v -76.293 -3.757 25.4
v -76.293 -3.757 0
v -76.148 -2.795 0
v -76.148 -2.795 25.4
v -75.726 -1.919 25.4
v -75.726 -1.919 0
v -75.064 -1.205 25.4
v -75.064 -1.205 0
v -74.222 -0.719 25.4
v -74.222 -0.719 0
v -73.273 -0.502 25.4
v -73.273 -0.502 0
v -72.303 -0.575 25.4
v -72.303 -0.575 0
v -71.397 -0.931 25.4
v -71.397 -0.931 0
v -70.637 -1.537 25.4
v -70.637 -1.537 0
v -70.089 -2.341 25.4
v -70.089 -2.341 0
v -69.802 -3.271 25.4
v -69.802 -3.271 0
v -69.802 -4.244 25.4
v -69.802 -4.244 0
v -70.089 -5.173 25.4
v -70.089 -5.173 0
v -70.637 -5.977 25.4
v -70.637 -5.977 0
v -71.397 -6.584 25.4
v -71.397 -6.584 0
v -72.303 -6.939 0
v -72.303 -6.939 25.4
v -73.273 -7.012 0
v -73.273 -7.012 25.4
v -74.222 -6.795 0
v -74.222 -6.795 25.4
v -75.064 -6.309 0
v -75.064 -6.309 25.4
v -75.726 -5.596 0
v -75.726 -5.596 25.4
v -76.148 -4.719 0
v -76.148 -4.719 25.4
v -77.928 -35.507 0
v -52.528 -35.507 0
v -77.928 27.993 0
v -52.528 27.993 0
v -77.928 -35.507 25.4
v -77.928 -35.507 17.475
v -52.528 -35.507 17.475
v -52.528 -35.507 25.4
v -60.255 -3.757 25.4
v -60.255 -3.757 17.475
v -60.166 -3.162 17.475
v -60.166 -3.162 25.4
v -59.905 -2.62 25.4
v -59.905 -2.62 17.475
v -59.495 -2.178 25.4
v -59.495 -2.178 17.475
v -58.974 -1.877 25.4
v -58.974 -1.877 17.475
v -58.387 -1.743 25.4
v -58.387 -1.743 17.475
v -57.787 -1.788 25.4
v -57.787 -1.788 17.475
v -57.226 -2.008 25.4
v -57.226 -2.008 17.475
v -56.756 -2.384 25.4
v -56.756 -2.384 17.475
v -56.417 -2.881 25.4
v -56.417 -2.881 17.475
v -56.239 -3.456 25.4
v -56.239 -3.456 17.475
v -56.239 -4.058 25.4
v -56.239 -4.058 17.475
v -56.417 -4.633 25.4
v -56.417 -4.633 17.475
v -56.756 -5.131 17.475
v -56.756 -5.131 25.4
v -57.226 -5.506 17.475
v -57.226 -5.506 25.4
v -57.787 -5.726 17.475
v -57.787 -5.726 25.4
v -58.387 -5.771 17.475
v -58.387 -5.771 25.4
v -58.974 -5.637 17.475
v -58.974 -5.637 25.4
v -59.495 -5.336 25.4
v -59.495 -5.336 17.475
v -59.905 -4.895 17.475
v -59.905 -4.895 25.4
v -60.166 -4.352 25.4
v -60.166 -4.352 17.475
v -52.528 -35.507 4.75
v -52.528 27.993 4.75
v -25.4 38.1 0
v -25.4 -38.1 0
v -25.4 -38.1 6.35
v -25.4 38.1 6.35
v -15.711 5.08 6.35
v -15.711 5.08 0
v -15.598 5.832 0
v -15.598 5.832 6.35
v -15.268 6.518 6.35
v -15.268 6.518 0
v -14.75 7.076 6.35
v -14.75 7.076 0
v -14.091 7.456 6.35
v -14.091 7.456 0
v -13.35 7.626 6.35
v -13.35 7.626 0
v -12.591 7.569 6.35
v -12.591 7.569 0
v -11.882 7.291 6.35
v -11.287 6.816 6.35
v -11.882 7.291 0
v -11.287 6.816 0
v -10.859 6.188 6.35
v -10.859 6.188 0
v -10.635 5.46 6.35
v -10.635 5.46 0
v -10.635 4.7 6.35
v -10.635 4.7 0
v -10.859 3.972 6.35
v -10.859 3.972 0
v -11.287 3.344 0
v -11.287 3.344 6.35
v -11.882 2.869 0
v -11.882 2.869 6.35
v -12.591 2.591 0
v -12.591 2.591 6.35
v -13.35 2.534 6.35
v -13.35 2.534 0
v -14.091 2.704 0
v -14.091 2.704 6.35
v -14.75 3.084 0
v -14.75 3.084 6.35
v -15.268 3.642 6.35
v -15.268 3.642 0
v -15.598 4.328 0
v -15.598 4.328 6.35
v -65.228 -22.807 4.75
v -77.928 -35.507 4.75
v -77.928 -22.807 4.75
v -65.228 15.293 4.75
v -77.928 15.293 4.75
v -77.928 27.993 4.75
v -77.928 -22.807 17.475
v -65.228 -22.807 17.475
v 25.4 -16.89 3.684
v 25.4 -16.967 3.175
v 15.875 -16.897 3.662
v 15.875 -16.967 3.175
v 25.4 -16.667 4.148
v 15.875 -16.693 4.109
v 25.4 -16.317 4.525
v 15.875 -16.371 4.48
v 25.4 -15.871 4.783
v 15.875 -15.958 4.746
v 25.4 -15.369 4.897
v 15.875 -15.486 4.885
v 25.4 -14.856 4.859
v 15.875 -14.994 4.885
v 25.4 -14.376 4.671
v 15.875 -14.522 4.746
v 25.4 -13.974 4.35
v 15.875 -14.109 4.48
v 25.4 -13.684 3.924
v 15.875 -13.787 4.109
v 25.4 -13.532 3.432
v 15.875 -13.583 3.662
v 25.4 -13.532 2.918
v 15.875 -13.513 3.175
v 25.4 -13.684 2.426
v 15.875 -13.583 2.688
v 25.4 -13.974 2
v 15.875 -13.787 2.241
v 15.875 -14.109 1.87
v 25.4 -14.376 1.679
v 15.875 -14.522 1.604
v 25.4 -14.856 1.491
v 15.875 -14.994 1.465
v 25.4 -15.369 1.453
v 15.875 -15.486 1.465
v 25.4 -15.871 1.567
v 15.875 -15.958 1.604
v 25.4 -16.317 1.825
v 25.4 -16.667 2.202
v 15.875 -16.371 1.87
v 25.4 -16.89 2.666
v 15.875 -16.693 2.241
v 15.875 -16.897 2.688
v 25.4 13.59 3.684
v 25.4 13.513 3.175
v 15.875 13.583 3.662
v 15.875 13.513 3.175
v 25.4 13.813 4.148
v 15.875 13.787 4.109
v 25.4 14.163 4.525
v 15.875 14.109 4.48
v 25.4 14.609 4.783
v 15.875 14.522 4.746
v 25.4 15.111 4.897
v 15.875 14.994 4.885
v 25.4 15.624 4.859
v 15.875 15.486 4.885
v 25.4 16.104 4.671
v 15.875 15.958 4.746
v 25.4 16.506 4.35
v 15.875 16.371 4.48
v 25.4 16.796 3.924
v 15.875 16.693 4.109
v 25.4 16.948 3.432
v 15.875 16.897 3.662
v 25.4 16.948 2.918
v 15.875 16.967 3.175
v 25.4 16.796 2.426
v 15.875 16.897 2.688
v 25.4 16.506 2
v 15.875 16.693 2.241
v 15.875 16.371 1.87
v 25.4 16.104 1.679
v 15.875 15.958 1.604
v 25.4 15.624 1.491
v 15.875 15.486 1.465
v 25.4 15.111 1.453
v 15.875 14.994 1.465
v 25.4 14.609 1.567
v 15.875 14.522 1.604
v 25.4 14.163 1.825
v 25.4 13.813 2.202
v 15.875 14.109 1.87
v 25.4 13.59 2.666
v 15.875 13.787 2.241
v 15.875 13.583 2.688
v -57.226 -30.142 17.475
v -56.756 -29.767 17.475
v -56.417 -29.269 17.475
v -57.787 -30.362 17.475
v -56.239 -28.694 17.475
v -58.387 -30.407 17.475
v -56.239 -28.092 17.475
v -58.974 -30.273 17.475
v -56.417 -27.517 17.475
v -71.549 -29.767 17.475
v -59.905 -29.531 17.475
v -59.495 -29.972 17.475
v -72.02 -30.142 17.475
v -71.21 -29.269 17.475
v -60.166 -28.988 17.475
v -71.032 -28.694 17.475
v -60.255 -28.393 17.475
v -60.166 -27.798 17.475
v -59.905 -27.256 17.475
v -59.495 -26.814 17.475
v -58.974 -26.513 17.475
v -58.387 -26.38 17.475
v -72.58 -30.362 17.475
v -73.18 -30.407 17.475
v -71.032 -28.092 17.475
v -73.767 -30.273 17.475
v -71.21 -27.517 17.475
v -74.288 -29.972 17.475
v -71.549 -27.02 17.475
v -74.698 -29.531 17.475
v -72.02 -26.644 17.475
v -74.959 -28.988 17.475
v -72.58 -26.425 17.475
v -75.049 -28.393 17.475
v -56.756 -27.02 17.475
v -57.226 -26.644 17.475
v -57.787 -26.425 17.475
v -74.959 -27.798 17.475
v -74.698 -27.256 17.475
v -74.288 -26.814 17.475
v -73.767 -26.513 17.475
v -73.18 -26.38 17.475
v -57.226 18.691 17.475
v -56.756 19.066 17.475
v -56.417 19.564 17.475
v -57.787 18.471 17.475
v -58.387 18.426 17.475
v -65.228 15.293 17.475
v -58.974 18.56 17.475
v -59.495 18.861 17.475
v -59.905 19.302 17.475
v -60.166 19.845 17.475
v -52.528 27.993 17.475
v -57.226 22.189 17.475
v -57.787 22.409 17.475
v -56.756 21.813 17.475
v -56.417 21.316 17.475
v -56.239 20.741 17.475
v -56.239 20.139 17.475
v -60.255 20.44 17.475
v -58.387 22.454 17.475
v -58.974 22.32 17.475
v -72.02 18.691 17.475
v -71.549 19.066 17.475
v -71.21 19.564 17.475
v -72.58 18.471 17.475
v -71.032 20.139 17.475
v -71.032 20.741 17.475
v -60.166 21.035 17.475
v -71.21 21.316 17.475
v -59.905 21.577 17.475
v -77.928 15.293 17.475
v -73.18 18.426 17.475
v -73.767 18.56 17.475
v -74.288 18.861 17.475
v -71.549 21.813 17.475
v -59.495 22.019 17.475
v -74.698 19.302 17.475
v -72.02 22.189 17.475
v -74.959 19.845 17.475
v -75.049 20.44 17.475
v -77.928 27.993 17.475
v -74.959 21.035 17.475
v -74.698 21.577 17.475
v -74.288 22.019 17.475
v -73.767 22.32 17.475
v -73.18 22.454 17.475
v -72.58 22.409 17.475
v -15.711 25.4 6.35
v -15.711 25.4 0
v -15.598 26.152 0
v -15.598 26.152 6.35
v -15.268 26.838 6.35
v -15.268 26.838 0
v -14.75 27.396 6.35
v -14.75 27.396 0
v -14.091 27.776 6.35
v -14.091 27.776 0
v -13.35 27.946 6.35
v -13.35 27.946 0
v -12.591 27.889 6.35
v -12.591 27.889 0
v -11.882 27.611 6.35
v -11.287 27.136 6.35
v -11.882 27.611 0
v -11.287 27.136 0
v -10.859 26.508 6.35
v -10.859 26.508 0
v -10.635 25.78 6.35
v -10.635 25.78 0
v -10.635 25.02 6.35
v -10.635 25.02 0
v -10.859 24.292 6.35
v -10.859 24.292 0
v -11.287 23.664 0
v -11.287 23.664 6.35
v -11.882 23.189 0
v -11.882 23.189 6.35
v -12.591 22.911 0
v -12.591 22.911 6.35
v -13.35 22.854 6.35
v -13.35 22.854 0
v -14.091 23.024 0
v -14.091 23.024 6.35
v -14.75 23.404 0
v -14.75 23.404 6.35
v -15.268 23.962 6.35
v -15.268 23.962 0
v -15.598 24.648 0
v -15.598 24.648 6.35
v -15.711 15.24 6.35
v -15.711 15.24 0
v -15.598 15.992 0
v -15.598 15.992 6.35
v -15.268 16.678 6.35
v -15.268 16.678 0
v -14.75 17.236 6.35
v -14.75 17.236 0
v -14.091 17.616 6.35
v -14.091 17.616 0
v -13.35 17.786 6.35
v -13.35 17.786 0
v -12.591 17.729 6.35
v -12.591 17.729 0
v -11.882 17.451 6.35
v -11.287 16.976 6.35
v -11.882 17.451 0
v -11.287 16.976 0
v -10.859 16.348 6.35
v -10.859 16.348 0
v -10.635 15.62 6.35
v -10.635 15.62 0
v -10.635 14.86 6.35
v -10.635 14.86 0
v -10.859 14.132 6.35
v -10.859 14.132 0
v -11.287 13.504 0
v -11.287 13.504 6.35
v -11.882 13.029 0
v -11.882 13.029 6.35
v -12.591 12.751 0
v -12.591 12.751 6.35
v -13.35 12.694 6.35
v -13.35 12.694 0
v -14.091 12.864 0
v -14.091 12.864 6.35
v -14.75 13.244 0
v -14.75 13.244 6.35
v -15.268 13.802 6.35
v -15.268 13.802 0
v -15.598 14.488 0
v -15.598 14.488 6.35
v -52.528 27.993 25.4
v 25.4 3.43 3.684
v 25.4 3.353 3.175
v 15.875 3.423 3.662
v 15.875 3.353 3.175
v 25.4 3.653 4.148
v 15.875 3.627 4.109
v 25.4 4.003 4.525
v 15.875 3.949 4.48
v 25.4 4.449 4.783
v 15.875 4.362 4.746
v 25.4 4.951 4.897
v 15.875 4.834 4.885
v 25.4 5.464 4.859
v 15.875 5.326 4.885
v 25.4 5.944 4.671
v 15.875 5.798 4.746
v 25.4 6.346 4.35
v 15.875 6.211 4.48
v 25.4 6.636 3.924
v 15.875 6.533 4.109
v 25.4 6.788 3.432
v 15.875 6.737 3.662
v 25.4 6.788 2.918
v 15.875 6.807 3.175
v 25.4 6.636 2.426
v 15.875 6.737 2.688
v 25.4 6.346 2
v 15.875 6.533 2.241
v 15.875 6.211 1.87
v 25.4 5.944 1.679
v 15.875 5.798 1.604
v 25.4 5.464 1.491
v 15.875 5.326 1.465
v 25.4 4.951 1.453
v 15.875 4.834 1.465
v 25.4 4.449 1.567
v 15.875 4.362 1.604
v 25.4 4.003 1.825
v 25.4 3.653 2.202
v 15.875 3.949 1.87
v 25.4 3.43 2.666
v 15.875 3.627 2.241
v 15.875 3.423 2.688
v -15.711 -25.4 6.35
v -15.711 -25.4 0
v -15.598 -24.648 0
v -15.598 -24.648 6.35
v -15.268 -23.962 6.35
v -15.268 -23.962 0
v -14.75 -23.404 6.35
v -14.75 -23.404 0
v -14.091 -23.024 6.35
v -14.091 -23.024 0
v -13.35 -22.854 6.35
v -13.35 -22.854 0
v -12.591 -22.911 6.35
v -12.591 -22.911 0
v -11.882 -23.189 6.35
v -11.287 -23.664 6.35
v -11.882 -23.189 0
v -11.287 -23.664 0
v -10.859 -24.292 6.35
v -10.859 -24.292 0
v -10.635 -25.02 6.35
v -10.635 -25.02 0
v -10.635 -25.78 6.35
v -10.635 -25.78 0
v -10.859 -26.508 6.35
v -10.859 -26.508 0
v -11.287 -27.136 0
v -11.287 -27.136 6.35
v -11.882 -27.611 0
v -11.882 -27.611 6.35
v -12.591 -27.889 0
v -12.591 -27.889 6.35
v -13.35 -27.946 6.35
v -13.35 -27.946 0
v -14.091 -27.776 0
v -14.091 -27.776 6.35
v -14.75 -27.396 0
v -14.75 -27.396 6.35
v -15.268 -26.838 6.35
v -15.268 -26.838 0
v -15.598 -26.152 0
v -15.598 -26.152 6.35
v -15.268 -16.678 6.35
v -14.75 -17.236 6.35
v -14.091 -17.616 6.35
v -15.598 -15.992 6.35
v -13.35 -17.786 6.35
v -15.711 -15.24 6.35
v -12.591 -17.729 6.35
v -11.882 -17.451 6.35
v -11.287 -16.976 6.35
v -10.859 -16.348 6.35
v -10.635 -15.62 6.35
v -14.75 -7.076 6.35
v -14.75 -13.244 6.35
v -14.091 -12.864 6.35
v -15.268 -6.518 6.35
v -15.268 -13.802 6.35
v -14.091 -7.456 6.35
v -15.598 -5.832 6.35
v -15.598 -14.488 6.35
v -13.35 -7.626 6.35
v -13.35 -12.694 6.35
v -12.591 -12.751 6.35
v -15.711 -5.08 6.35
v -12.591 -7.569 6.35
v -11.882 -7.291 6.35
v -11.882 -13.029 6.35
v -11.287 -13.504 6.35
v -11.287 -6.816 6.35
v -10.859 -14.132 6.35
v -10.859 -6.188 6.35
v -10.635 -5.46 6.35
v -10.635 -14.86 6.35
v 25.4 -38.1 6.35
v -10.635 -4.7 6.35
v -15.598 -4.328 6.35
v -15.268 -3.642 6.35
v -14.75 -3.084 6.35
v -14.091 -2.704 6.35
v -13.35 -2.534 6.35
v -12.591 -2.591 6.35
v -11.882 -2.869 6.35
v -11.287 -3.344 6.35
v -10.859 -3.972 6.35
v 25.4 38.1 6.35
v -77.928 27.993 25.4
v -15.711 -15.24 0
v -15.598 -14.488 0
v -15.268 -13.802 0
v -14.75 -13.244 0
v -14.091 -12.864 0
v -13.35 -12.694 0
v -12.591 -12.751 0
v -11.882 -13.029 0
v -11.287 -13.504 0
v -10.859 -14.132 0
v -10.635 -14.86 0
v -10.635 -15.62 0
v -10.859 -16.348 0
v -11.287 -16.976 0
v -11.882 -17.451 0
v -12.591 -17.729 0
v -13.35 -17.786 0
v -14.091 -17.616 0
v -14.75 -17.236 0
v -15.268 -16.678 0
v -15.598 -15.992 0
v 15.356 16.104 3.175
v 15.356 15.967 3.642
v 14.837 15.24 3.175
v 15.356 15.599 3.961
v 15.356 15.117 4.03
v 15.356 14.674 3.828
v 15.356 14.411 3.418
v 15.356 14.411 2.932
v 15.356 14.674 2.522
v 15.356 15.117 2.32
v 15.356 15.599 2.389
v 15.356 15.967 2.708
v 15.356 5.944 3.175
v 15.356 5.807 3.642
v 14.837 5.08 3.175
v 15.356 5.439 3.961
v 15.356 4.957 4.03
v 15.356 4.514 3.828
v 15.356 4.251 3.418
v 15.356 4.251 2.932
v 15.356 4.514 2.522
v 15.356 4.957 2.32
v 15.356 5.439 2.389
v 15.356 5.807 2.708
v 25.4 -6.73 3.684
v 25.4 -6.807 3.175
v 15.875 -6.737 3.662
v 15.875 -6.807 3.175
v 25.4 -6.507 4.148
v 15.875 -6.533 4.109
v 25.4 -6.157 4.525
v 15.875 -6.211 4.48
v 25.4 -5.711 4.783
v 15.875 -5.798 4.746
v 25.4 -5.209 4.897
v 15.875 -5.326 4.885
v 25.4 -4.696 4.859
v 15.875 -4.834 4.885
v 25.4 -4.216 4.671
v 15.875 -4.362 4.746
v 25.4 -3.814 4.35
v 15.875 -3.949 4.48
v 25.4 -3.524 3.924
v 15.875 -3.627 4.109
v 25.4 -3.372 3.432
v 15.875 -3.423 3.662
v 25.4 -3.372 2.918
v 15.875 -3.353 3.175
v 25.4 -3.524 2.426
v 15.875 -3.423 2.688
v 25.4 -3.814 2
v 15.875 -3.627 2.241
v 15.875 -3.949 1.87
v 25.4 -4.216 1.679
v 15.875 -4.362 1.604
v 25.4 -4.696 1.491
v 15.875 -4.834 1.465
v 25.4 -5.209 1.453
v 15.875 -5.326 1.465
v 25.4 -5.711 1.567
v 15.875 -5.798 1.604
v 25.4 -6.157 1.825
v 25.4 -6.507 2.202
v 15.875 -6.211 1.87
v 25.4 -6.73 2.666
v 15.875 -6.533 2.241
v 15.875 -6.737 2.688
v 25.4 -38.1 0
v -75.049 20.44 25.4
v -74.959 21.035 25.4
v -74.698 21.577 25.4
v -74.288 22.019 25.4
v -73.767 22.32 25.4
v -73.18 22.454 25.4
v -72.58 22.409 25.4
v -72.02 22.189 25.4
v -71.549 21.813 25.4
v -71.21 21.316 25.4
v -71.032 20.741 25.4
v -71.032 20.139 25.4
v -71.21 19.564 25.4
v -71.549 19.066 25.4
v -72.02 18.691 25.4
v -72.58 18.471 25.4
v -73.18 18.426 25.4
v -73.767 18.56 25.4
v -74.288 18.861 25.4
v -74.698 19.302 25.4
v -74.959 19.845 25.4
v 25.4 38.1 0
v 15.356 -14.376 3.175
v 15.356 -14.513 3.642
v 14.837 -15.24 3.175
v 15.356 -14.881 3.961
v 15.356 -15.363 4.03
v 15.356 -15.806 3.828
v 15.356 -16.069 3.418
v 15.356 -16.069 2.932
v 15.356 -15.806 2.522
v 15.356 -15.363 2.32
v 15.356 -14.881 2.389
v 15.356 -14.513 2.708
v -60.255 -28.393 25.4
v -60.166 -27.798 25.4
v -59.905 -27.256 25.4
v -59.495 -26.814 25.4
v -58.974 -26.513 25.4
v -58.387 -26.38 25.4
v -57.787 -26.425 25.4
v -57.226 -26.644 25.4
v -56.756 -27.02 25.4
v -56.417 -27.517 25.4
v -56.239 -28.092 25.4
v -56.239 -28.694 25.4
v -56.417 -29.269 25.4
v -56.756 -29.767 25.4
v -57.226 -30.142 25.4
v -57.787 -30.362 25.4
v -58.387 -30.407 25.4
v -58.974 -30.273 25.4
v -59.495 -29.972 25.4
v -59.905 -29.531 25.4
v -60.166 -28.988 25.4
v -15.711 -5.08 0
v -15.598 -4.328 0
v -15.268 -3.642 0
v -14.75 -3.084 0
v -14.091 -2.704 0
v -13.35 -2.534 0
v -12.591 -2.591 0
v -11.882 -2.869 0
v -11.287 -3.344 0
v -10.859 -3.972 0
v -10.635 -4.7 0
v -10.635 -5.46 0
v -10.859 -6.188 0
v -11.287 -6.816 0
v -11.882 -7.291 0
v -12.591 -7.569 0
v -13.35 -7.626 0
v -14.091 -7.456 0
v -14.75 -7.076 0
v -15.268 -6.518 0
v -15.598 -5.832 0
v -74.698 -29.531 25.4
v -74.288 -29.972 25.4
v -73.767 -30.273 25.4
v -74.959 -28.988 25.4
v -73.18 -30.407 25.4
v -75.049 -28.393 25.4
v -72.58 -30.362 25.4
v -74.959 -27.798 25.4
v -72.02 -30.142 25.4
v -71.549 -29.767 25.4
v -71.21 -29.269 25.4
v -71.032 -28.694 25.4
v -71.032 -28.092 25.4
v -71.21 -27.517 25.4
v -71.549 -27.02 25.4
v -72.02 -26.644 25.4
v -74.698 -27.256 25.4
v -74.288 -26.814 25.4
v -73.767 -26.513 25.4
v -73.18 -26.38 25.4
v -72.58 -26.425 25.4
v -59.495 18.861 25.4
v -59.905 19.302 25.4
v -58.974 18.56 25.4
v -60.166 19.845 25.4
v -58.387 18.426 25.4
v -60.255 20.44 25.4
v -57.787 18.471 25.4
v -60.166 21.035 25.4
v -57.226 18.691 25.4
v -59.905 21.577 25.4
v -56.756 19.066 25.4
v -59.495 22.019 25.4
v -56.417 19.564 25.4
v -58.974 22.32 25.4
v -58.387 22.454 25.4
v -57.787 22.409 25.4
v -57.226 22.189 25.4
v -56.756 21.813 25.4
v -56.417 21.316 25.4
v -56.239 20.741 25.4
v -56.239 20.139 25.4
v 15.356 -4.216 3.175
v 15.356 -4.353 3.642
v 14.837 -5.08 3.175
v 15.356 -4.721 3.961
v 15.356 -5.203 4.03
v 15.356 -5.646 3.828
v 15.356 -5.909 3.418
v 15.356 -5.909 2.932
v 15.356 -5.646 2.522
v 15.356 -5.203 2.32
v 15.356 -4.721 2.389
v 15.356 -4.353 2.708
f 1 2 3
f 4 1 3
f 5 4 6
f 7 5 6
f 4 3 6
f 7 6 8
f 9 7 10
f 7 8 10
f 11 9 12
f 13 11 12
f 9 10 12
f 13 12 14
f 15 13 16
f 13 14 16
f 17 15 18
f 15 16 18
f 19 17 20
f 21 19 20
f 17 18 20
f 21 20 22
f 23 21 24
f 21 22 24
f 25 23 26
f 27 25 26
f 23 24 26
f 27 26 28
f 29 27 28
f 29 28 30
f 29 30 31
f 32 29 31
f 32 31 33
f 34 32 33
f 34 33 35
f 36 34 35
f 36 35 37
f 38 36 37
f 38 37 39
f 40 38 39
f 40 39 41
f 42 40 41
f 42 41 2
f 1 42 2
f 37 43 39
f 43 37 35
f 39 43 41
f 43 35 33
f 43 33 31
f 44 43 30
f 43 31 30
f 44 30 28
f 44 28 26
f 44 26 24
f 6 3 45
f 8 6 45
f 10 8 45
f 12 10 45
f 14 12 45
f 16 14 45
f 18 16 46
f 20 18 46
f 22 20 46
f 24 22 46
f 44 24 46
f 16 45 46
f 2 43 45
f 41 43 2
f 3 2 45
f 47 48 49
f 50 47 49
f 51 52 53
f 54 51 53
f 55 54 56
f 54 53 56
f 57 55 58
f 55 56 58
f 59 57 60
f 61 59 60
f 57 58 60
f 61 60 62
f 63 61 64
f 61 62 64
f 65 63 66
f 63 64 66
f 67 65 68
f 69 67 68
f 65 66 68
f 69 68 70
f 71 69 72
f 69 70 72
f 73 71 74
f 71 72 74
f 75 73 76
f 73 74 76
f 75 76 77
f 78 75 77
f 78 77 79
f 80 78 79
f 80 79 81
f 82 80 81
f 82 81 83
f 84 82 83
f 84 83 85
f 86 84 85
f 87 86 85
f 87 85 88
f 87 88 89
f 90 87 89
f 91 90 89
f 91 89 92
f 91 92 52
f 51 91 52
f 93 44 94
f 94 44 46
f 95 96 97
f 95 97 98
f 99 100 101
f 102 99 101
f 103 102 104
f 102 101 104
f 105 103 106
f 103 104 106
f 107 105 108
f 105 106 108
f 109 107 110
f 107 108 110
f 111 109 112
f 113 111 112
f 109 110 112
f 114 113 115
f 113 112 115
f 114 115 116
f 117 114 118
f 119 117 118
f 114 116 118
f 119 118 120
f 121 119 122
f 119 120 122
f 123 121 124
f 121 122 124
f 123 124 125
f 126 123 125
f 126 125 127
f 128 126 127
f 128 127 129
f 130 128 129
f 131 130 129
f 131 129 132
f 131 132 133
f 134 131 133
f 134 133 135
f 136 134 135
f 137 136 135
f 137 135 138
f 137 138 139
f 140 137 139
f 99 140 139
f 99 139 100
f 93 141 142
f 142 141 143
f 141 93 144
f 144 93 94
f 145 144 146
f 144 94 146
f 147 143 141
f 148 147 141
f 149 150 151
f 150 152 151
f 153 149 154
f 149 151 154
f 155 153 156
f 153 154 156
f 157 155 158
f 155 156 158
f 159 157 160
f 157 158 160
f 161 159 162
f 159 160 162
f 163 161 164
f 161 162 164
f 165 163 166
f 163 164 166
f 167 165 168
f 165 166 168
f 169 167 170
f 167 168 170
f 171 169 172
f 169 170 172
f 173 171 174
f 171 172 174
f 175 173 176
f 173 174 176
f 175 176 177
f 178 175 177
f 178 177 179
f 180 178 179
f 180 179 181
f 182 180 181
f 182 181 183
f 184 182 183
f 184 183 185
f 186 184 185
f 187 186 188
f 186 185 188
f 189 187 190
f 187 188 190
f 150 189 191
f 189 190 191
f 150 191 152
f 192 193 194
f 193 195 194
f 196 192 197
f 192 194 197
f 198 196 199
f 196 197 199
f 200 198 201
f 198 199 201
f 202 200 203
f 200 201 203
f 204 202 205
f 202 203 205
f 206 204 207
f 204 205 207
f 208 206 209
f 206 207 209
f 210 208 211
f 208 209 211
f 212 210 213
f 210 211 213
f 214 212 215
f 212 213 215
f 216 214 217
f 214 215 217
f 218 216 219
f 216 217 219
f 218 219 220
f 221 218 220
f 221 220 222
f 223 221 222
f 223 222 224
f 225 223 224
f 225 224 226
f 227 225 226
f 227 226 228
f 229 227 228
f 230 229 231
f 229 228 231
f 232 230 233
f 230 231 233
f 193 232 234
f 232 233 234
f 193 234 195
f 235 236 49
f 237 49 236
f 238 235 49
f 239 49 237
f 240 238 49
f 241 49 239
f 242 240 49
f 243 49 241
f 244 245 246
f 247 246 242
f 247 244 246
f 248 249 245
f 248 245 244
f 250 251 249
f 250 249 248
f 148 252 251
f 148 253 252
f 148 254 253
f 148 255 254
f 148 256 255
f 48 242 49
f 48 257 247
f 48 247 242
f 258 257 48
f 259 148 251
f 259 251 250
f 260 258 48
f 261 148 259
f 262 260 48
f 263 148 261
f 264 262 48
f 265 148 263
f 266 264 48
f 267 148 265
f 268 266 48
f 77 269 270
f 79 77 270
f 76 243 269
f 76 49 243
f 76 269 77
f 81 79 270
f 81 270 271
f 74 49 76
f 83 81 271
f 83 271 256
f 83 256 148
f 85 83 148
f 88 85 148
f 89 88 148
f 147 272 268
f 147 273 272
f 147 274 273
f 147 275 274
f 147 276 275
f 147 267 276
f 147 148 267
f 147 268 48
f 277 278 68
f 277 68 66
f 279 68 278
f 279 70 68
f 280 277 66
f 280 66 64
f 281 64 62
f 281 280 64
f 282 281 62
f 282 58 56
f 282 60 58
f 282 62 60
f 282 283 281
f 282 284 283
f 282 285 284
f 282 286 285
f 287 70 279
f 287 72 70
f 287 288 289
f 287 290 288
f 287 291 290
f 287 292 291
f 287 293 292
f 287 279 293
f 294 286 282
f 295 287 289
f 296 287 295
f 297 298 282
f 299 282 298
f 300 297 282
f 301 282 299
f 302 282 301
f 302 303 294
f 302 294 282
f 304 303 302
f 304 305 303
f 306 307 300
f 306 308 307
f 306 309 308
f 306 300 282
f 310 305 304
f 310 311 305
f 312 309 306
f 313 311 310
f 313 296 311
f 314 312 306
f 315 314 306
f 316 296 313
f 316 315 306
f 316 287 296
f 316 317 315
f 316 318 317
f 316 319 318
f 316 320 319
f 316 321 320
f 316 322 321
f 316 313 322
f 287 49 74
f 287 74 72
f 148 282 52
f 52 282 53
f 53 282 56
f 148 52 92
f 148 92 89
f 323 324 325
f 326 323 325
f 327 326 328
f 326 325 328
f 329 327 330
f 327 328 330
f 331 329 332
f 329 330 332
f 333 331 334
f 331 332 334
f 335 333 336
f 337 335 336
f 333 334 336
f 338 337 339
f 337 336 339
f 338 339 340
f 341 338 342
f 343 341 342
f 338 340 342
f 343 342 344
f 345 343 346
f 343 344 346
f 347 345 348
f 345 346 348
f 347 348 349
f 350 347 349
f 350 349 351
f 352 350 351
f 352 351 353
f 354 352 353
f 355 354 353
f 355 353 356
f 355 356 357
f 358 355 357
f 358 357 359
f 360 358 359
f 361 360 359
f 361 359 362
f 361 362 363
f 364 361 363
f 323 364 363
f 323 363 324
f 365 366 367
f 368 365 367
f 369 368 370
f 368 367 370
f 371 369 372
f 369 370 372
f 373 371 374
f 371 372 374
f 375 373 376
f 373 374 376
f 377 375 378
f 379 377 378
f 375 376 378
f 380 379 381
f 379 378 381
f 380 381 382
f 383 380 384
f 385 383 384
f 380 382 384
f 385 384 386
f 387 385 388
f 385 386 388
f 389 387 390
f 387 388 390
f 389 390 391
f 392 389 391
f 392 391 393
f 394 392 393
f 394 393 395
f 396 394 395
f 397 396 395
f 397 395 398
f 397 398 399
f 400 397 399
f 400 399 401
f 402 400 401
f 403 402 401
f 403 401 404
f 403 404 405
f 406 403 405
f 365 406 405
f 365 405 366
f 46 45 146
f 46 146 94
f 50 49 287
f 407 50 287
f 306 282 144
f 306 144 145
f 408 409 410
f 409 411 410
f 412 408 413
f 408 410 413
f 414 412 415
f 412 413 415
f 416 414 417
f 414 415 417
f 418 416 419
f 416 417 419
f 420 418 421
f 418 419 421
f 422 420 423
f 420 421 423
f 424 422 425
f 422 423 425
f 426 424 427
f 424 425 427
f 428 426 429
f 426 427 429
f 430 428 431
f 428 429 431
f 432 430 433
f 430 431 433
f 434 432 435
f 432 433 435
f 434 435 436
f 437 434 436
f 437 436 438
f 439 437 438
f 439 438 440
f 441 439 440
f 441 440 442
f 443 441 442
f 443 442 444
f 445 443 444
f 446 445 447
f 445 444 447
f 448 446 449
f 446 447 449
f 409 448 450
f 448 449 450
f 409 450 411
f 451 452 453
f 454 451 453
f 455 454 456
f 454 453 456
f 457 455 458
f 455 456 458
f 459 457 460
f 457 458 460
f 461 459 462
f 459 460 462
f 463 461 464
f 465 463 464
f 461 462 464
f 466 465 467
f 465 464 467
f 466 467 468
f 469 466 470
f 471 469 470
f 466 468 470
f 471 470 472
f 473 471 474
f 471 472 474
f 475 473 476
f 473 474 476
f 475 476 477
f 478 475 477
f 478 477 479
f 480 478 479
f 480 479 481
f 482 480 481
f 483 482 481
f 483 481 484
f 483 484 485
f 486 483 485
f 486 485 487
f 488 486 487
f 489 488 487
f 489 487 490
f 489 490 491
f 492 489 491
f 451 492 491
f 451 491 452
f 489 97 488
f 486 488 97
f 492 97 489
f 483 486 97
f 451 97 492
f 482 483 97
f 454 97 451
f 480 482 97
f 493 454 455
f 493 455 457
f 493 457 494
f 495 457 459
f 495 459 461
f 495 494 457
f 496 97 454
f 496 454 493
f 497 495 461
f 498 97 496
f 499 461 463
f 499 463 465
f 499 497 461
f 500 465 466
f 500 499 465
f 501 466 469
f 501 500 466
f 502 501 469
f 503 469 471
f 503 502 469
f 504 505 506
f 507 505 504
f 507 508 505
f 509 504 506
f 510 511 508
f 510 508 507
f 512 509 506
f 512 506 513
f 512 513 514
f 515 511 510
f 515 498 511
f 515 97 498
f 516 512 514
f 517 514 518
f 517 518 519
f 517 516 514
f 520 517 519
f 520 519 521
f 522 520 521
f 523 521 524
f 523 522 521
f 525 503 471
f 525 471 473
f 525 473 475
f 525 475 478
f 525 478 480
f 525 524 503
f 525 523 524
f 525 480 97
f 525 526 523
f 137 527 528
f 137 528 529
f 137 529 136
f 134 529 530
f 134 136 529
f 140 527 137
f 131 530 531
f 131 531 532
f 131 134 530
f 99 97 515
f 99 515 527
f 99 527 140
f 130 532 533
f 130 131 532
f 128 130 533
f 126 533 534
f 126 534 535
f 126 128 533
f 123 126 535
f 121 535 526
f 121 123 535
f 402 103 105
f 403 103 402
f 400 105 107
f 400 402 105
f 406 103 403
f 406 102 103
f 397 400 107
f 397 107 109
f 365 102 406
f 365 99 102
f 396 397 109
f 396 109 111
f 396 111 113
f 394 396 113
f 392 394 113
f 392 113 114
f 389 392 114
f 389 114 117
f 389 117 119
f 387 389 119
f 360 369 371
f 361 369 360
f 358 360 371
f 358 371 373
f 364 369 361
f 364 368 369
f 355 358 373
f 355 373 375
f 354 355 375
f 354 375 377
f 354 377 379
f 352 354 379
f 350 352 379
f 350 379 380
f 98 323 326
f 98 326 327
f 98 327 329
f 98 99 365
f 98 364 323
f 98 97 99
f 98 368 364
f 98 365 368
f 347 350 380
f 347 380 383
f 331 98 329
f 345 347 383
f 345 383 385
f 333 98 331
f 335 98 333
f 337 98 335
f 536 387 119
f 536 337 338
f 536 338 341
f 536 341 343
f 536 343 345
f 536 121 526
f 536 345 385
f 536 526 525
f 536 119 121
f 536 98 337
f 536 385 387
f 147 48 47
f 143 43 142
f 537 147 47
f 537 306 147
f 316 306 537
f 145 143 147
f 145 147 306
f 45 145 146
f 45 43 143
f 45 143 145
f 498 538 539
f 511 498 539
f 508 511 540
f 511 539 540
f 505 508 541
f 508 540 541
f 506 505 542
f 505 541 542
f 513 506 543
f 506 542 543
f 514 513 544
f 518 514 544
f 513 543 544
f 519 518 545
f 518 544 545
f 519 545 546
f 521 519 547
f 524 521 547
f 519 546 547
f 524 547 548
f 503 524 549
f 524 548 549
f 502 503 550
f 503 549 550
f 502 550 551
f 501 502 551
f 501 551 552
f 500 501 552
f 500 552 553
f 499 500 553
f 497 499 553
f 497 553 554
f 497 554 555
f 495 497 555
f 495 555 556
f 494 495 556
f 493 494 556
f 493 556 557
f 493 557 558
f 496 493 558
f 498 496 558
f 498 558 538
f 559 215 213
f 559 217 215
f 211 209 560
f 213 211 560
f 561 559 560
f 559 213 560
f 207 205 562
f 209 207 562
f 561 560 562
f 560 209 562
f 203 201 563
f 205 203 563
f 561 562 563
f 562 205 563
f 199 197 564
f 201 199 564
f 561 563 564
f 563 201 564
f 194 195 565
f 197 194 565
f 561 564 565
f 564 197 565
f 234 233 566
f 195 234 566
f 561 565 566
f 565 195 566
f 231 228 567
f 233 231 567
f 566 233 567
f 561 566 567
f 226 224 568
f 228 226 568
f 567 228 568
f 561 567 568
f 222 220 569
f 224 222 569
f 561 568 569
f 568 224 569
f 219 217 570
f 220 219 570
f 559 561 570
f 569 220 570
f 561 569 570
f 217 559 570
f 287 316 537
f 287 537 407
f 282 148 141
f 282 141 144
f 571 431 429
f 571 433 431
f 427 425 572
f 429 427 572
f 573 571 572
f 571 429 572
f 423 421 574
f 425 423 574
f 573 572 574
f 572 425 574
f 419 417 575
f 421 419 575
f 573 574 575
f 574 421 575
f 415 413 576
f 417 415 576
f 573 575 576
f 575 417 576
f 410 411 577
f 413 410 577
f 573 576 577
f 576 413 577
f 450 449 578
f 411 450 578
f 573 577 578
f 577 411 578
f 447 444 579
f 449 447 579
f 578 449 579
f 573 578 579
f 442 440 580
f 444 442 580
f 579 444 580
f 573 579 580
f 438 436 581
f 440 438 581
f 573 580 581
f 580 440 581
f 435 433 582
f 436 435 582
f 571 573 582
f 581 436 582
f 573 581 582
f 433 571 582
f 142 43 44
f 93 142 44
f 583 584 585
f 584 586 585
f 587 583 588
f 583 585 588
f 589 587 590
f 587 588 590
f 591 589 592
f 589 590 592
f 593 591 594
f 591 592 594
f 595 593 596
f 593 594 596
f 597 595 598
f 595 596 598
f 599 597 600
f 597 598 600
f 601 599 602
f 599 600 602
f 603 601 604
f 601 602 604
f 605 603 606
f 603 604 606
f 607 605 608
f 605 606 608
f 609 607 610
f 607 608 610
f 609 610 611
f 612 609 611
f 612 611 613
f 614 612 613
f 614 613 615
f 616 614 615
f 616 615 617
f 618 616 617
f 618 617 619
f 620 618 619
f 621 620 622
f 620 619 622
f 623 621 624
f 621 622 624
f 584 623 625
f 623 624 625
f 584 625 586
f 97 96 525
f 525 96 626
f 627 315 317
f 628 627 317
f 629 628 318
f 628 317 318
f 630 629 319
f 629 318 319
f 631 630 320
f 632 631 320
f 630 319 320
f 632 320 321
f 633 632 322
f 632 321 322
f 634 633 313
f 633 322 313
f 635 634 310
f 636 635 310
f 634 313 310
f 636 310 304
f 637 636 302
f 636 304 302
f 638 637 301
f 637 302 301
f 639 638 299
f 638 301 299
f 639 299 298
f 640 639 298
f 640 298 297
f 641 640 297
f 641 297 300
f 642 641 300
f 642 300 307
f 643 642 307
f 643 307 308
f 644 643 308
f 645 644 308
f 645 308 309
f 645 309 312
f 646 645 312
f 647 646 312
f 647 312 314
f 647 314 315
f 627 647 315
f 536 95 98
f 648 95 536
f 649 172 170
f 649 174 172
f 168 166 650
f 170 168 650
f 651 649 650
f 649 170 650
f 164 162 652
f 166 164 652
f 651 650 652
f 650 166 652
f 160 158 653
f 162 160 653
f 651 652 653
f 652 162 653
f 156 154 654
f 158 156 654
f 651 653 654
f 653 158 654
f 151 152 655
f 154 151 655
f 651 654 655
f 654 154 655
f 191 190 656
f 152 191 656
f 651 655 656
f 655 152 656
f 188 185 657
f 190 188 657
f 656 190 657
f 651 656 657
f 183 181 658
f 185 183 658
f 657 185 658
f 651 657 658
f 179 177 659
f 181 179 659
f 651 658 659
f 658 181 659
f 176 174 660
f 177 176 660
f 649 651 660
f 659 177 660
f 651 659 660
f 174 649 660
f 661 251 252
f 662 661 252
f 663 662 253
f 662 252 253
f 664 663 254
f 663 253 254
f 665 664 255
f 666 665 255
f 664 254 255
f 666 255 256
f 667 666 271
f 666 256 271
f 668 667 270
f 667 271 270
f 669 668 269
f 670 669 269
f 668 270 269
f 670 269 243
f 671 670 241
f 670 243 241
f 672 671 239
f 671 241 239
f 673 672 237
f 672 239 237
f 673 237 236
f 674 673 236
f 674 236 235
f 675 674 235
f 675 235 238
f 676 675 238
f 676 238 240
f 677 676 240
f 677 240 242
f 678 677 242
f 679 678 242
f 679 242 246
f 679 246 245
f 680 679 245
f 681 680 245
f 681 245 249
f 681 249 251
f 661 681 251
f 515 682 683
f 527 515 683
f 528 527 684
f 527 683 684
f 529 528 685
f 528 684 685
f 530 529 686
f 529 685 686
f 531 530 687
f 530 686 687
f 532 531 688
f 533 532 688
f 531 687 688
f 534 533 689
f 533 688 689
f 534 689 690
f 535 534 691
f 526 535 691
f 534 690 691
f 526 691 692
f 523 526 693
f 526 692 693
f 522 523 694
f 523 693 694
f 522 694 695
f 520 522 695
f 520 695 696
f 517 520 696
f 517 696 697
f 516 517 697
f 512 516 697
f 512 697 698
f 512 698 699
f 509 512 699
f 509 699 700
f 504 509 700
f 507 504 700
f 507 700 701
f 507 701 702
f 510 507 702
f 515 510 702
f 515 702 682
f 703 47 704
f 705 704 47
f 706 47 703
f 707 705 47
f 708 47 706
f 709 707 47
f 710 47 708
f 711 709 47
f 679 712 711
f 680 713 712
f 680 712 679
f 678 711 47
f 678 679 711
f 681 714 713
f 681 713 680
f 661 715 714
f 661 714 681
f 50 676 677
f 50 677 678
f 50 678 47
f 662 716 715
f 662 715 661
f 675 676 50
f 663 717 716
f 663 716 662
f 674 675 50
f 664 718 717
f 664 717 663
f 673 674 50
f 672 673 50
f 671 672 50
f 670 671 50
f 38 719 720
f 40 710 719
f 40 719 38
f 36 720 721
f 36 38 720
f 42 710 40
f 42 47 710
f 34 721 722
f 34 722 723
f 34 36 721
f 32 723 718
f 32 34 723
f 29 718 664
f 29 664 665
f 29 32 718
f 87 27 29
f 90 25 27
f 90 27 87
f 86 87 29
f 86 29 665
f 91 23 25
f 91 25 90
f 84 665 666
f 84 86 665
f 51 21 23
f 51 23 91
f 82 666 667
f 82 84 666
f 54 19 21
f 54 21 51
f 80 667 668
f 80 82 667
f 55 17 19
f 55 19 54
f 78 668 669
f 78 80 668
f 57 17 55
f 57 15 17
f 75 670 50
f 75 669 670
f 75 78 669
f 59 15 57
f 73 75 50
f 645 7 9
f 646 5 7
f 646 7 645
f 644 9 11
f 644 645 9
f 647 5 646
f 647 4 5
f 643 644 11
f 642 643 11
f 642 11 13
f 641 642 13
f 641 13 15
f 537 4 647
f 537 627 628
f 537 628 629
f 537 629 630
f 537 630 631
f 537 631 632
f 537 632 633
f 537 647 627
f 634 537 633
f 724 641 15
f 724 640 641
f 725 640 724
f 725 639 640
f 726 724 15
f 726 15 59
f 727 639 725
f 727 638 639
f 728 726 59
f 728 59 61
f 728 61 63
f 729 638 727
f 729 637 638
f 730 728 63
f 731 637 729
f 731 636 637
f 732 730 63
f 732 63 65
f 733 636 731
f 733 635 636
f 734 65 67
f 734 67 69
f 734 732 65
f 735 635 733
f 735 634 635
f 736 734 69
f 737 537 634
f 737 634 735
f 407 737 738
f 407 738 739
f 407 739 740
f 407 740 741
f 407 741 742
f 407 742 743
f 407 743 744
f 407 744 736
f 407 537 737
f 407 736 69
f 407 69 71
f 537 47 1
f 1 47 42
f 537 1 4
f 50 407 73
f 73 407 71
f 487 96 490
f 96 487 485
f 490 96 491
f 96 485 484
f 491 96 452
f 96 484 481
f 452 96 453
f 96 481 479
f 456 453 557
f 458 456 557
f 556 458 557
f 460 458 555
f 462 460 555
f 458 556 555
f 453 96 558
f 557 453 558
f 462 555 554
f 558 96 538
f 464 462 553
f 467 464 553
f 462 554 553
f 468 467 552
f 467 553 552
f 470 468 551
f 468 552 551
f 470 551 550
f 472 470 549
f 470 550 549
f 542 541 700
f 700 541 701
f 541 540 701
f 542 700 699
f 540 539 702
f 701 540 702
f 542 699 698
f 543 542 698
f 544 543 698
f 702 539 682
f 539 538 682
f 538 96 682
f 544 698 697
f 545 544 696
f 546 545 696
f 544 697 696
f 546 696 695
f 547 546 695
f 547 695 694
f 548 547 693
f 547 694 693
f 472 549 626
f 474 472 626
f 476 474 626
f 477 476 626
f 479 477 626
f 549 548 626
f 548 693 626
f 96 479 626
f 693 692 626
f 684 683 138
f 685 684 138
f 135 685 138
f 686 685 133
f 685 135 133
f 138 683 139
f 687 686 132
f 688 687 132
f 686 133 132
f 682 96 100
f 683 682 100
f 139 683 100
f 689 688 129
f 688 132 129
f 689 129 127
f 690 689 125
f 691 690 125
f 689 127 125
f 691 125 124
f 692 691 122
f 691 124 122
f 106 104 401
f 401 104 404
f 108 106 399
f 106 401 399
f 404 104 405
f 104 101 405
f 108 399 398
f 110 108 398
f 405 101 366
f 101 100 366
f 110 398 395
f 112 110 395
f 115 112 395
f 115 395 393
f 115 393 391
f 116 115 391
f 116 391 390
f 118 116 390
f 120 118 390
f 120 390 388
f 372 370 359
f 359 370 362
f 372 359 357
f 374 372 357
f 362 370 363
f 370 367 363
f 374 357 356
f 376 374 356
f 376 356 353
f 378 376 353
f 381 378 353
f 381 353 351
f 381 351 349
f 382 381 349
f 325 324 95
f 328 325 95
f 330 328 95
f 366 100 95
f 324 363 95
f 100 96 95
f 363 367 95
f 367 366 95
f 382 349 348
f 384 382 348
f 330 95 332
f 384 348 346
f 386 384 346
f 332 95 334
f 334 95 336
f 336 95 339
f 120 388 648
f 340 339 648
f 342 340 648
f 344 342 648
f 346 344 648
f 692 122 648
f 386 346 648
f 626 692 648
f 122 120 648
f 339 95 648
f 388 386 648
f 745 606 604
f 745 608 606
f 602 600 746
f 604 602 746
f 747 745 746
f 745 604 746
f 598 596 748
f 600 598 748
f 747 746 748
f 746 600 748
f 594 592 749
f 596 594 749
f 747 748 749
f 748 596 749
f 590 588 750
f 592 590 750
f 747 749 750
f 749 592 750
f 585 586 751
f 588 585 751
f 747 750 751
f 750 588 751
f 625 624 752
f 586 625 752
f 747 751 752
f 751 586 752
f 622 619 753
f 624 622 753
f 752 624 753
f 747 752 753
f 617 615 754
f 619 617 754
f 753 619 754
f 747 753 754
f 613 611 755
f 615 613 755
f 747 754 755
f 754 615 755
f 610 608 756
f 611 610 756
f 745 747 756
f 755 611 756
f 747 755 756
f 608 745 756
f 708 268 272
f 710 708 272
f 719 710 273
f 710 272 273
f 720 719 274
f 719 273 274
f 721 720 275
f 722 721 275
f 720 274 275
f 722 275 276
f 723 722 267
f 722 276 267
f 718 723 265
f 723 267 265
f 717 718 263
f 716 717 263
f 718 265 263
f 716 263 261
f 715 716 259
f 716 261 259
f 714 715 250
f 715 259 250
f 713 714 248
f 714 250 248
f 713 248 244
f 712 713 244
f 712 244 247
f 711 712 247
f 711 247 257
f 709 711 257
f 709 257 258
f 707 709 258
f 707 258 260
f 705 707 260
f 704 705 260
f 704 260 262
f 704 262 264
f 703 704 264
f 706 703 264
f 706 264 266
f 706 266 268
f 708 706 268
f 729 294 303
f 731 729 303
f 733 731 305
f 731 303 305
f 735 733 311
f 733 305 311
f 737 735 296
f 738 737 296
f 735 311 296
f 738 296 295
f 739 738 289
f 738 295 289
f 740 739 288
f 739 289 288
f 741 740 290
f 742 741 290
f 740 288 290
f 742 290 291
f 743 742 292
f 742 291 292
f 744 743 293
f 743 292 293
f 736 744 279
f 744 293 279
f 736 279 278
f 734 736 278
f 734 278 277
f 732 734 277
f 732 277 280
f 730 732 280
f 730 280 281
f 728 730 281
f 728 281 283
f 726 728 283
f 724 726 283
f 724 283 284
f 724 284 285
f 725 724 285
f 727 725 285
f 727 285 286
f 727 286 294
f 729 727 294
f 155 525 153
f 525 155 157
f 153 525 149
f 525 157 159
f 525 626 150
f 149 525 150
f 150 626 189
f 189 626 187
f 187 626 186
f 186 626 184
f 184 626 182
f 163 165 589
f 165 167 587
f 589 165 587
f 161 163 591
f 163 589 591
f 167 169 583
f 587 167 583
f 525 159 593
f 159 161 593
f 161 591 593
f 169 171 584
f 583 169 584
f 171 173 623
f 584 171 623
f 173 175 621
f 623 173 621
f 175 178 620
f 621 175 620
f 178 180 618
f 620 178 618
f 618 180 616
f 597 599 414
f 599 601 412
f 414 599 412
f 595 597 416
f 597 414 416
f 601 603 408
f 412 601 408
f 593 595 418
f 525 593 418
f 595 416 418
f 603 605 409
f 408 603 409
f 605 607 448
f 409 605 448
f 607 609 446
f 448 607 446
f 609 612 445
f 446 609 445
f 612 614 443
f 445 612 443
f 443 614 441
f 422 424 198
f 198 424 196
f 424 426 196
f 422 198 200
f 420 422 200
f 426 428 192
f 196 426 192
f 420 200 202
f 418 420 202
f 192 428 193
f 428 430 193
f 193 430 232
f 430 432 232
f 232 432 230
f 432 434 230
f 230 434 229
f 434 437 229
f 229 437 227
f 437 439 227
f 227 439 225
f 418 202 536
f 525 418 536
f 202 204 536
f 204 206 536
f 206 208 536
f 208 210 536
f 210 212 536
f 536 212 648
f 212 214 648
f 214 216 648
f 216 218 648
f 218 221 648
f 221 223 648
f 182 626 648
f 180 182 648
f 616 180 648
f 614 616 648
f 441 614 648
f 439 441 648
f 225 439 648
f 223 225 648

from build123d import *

# Parameters (mm, degrees)
F0_W      = 50.8
F0_H      = 76.2
F1_DEPTH  = 6.35
F3_D      = 5.1054
F5_D      = 3.4544
F5_DEPTH  = 9.525
F5_TIP    = 1.0378064612
F6_W      = 25.4
F6_H      = 63.5
F7_DEPTH  = 25.4
F8_W      = 25.4
F8_H      = 12.7254
F9_DEPTH  = 12.7
F10_W     = 25.4
F10_H     = 12.7254
F11_DEPTH = 12.7
F12_W     = 38.1
F12_H     = 12.7254
F13_DEPTH = 12.7
F15_D     = 4.0386
F15_DEPTH = 9.525
F15_TIP   = 1.213317848
F16_D     = 6.5278


with BuildPart() as f1:
    # F0 (on Top) → F1 (new body)
    with BuildSketch(Plane.XY):
        Rectangle(F0_W, F0_H)
    extrude(amount=F1_DEPTH)

    # F3 (through all)
    with Locations(Plane.XY.offset(6.35)):
        with Locations((-13.1587591022, 25.4), (-13.1587591022, 15.24), (-13.1587591022, 5.08), (-13.1587591022, -5.08), (-13.1587591022, -15.24), (-13.1587591022, -25.4)):
            Hole(F3_D / 2)

    # F5
    with Locations(Plane.YZ.offset(25.4)):
        with Locations((-15.24, 3.175), (-5.08, 3.175), (5.08, 3.175), (15.24, 3.175)):
            Hole(F5_D / 2, depth=F5_DEPTH)
            with Locations((0, 0, -(F5_DEPTH + F5_TIP / 2))):  # 118° drill point
                Cone(0, F5_D / 2, F5_TIP, mode=Mode.SUBTRACT)


with BuildPart() as f7:
    # F6 (on Top) → F7 (new body)
    with BuildSketch(Plane.XY):
        with Locations((-65.2278307825, -3.75713877)):
            Rectangle(F6_W, F6_H)
    extrude(amount=F7_DEPTH)

    # F8 (on face) → F9 (cut)
    with BuildSketch(Plane.XZ.offset(35.50713877)):
        with Locations((-65.2278307825, 11.1125)):
            Rectangle(F8_W, F8_H)
    extrude(amount=-F9_DEPTH, mode=Mode.SUBTRACT)

    # F10 (on face) → F11 (cut)
    with BuildSketch(Plane(origin=(0, 27.99286123, 0), x_dir=(-1, 0, 0), z_dir=(0, 1, 0))):
        with Locations((65.2278307825, 11.1125)):
            Rectangle(F10_W, F10_H)
    extrude(amount=-F11_DEPTH, mode=Mode.SUBTRACT)

    # F12 (on face) → F13 (cut)
    with BuildSketch(Plane.YZ.offset(-52.5278307825)):
        with Locations((-3.75713877, 11.1125)):
            Rectangle(F12_W, F12_H)
    extrude(amount=-F13_DEPTH, mode=Mode.SUBTRACT)

    # F15
    with Locations(Plane.XY.offset(25.4)):
        with Locations((-73.0292052031, 20.4399321228), (-58.2360997796, 20.4399321228), (-58.2360997796, -3.75713877), (-58.2360997796, -28.3932108432), (-73.0292052031, -28.3932108432)):
            Hole(F15_D / 2, depth=F15_DEPTH)
            with Locations((0, 0, -(F15_DEPTH + F15_TIP / 2))):  # 118° drill point
                Cone(0, F15_D / 2, F15_TIP, mode=Mode.SUBTRACT)

    # F16 (through all)
    with Locations(Plane.XY.offset(25.4)):
        with Locations((-73.0292052031, -3.75713877)):
            Hole(F16_D / 2)


solid = Compound([f1.part, f7.part])
